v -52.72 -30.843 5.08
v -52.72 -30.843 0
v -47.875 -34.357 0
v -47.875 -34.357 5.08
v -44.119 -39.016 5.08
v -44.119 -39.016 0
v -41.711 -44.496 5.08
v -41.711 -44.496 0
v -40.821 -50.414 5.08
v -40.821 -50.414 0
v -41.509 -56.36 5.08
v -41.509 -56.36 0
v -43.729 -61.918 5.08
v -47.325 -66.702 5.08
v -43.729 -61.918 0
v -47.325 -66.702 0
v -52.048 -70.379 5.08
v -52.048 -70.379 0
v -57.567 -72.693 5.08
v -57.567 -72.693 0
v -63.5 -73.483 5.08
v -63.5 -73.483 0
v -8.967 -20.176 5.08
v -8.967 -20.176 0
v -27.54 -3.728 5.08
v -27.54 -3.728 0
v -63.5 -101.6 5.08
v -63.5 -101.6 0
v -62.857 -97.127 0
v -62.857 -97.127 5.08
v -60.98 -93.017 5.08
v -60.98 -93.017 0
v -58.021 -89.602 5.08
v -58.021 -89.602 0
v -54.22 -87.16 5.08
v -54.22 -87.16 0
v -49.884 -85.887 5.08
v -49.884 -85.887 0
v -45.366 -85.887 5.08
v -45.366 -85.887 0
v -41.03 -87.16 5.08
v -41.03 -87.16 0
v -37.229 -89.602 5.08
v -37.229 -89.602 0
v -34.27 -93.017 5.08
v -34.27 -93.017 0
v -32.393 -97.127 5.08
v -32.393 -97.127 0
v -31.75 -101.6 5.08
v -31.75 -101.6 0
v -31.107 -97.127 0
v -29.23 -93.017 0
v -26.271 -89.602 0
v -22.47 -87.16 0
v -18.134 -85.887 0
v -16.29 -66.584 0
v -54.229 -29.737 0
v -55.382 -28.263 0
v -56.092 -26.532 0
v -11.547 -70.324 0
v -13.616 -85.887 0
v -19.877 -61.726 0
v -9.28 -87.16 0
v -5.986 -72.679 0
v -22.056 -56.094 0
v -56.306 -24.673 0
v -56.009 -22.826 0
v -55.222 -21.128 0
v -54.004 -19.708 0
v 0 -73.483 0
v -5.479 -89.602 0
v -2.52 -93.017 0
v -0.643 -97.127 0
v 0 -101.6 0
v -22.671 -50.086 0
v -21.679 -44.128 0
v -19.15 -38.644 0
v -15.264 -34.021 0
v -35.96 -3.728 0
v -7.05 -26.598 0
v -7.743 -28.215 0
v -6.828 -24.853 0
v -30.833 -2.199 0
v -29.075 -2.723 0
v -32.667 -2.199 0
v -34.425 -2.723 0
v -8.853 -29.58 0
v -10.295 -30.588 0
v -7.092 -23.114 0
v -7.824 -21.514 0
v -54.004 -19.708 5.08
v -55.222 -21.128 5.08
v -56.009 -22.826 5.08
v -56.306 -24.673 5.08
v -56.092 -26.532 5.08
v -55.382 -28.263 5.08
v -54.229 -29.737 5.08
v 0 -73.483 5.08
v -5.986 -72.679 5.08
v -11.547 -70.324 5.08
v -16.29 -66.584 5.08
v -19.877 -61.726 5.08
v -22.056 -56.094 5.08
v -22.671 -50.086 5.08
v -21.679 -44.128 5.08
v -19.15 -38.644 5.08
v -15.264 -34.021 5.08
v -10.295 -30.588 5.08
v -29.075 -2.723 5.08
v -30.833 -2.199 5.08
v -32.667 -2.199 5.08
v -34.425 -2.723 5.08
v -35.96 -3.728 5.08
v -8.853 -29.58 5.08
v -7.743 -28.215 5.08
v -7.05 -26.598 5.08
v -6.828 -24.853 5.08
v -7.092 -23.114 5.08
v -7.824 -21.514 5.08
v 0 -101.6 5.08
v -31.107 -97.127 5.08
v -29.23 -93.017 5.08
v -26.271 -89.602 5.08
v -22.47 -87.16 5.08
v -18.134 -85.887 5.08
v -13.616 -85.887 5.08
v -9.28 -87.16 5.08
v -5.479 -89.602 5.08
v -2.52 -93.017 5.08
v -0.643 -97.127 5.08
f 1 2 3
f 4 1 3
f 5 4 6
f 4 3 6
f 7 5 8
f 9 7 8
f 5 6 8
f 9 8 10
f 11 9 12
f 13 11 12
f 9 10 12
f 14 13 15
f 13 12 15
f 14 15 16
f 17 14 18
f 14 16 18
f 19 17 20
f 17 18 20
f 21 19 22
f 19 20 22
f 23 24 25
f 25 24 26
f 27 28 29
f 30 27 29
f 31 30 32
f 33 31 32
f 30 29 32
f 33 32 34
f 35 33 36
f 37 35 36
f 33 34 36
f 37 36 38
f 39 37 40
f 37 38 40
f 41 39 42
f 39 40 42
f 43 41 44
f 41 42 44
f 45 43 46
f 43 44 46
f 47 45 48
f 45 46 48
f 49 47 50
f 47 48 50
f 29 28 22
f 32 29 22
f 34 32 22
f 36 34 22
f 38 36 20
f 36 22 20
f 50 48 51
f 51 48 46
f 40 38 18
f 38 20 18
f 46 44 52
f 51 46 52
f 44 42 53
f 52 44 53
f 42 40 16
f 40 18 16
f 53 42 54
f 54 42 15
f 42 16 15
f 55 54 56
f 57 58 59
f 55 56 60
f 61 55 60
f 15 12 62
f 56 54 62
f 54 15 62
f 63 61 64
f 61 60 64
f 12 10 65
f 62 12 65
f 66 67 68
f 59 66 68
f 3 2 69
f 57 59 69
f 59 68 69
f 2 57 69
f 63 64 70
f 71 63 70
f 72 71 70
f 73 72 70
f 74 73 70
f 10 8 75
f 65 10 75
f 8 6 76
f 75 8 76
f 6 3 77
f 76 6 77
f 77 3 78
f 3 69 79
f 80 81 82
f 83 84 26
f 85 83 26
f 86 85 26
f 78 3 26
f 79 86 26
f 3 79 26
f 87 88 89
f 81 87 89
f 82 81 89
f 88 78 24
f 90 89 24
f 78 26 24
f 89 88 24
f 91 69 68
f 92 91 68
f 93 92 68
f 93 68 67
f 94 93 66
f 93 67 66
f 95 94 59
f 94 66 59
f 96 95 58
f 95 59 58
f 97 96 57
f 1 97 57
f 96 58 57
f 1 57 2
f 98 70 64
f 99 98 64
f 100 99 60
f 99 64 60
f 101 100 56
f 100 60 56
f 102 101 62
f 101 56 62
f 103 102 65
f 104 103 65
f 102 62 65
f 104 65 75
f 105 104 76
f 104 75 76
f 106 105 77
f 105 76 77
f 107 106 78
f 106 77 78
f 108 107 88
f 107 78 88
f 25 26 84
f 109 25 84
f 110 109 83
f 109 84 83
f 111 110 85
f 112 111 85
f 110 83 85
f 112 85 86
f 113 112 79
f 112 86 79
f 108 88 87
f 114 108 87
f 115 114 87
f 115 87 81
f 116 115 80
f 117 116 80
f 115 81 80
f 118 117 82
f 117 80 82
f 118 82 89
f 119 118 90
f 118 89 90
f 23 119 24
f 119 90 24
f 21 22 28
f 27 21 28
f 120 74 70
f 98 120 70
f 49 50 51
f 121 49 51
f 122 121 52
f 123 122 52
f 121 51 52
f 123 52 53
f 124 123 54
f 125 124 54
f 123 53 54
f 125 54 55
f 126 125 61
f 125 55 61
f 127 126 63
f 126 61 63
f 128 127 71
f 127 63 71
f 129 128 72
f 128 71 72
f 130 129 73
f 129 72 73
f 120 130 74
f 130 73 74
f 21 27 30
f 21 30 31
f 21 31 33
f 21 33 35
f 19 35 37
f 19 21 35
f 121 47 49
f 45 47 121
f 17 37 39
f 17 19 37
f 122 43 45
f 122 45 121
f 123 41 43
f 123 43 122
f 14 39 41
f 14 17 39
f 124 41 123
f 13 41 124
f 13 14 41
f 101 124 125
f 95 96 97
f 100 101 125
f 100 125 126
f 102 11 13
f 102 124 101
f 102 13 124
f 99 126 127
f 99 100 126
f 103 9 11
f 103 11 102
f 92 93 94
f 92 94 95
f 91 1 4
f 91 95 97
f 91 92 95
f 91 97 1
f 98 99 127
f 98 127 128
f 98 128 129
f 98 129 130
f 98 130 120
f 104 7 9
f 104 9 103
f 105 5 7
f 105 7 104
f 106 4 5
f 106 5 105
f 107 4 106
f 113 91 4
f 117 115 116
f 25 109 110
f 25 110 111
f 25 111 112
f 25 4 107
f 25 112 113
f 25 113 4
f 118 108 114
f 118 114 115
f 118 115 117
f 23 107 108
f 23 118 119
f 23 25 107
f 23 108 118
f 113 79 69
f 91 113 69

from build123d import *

# Parameters (mm, degrees)
F1_DEPTH = 5.08


with BuildPart() as f1:
    # F0 (on Top) → F1 (new body)
    with BuildSketch(Plane.XY):
        with BuildLine():
            ThreePointArc((-52.720005, -30.842755), (-41.509299, -56.359582), (-63.5, -73.48259))
            Line((-63.5, -73.48259), (-63.5, -101.6))
            ThreePointArc((-63.5, -101.6), (-47.625, -85.725), (-31.75, -101.6))
            ThreePointArc((-31.75, -101.6), (-15.875, -85.725), (0, -101.6))
            Line((0, -101.6), (0, -73.48259))
            ThreePointArc((0, -73.48259), (-22.056218, -56.093689), (-10.29501, -30.588304))
            ThreePointArc((-10.29501, -30.588304), (-6.878118, -25.733334), (-8.967166, -20.176198))
            Line((-8.967166, -20.176198), (-27.540063, -3.728268))
            ThreePointArc((-27.540063, -3.728268), (-31.75, -2.132102), (-35.959937, -3.728268))
            Line((-35.959937, -3.728268), (-54.003646, -19.707556))
            ThreePointArc((-54.003646, -19.707556), (-56.263112, -25.609609), (-52.720005, -30.842755))
        make_face()
    extrude(amount=F1_DEPTH)


solid = f1.part
